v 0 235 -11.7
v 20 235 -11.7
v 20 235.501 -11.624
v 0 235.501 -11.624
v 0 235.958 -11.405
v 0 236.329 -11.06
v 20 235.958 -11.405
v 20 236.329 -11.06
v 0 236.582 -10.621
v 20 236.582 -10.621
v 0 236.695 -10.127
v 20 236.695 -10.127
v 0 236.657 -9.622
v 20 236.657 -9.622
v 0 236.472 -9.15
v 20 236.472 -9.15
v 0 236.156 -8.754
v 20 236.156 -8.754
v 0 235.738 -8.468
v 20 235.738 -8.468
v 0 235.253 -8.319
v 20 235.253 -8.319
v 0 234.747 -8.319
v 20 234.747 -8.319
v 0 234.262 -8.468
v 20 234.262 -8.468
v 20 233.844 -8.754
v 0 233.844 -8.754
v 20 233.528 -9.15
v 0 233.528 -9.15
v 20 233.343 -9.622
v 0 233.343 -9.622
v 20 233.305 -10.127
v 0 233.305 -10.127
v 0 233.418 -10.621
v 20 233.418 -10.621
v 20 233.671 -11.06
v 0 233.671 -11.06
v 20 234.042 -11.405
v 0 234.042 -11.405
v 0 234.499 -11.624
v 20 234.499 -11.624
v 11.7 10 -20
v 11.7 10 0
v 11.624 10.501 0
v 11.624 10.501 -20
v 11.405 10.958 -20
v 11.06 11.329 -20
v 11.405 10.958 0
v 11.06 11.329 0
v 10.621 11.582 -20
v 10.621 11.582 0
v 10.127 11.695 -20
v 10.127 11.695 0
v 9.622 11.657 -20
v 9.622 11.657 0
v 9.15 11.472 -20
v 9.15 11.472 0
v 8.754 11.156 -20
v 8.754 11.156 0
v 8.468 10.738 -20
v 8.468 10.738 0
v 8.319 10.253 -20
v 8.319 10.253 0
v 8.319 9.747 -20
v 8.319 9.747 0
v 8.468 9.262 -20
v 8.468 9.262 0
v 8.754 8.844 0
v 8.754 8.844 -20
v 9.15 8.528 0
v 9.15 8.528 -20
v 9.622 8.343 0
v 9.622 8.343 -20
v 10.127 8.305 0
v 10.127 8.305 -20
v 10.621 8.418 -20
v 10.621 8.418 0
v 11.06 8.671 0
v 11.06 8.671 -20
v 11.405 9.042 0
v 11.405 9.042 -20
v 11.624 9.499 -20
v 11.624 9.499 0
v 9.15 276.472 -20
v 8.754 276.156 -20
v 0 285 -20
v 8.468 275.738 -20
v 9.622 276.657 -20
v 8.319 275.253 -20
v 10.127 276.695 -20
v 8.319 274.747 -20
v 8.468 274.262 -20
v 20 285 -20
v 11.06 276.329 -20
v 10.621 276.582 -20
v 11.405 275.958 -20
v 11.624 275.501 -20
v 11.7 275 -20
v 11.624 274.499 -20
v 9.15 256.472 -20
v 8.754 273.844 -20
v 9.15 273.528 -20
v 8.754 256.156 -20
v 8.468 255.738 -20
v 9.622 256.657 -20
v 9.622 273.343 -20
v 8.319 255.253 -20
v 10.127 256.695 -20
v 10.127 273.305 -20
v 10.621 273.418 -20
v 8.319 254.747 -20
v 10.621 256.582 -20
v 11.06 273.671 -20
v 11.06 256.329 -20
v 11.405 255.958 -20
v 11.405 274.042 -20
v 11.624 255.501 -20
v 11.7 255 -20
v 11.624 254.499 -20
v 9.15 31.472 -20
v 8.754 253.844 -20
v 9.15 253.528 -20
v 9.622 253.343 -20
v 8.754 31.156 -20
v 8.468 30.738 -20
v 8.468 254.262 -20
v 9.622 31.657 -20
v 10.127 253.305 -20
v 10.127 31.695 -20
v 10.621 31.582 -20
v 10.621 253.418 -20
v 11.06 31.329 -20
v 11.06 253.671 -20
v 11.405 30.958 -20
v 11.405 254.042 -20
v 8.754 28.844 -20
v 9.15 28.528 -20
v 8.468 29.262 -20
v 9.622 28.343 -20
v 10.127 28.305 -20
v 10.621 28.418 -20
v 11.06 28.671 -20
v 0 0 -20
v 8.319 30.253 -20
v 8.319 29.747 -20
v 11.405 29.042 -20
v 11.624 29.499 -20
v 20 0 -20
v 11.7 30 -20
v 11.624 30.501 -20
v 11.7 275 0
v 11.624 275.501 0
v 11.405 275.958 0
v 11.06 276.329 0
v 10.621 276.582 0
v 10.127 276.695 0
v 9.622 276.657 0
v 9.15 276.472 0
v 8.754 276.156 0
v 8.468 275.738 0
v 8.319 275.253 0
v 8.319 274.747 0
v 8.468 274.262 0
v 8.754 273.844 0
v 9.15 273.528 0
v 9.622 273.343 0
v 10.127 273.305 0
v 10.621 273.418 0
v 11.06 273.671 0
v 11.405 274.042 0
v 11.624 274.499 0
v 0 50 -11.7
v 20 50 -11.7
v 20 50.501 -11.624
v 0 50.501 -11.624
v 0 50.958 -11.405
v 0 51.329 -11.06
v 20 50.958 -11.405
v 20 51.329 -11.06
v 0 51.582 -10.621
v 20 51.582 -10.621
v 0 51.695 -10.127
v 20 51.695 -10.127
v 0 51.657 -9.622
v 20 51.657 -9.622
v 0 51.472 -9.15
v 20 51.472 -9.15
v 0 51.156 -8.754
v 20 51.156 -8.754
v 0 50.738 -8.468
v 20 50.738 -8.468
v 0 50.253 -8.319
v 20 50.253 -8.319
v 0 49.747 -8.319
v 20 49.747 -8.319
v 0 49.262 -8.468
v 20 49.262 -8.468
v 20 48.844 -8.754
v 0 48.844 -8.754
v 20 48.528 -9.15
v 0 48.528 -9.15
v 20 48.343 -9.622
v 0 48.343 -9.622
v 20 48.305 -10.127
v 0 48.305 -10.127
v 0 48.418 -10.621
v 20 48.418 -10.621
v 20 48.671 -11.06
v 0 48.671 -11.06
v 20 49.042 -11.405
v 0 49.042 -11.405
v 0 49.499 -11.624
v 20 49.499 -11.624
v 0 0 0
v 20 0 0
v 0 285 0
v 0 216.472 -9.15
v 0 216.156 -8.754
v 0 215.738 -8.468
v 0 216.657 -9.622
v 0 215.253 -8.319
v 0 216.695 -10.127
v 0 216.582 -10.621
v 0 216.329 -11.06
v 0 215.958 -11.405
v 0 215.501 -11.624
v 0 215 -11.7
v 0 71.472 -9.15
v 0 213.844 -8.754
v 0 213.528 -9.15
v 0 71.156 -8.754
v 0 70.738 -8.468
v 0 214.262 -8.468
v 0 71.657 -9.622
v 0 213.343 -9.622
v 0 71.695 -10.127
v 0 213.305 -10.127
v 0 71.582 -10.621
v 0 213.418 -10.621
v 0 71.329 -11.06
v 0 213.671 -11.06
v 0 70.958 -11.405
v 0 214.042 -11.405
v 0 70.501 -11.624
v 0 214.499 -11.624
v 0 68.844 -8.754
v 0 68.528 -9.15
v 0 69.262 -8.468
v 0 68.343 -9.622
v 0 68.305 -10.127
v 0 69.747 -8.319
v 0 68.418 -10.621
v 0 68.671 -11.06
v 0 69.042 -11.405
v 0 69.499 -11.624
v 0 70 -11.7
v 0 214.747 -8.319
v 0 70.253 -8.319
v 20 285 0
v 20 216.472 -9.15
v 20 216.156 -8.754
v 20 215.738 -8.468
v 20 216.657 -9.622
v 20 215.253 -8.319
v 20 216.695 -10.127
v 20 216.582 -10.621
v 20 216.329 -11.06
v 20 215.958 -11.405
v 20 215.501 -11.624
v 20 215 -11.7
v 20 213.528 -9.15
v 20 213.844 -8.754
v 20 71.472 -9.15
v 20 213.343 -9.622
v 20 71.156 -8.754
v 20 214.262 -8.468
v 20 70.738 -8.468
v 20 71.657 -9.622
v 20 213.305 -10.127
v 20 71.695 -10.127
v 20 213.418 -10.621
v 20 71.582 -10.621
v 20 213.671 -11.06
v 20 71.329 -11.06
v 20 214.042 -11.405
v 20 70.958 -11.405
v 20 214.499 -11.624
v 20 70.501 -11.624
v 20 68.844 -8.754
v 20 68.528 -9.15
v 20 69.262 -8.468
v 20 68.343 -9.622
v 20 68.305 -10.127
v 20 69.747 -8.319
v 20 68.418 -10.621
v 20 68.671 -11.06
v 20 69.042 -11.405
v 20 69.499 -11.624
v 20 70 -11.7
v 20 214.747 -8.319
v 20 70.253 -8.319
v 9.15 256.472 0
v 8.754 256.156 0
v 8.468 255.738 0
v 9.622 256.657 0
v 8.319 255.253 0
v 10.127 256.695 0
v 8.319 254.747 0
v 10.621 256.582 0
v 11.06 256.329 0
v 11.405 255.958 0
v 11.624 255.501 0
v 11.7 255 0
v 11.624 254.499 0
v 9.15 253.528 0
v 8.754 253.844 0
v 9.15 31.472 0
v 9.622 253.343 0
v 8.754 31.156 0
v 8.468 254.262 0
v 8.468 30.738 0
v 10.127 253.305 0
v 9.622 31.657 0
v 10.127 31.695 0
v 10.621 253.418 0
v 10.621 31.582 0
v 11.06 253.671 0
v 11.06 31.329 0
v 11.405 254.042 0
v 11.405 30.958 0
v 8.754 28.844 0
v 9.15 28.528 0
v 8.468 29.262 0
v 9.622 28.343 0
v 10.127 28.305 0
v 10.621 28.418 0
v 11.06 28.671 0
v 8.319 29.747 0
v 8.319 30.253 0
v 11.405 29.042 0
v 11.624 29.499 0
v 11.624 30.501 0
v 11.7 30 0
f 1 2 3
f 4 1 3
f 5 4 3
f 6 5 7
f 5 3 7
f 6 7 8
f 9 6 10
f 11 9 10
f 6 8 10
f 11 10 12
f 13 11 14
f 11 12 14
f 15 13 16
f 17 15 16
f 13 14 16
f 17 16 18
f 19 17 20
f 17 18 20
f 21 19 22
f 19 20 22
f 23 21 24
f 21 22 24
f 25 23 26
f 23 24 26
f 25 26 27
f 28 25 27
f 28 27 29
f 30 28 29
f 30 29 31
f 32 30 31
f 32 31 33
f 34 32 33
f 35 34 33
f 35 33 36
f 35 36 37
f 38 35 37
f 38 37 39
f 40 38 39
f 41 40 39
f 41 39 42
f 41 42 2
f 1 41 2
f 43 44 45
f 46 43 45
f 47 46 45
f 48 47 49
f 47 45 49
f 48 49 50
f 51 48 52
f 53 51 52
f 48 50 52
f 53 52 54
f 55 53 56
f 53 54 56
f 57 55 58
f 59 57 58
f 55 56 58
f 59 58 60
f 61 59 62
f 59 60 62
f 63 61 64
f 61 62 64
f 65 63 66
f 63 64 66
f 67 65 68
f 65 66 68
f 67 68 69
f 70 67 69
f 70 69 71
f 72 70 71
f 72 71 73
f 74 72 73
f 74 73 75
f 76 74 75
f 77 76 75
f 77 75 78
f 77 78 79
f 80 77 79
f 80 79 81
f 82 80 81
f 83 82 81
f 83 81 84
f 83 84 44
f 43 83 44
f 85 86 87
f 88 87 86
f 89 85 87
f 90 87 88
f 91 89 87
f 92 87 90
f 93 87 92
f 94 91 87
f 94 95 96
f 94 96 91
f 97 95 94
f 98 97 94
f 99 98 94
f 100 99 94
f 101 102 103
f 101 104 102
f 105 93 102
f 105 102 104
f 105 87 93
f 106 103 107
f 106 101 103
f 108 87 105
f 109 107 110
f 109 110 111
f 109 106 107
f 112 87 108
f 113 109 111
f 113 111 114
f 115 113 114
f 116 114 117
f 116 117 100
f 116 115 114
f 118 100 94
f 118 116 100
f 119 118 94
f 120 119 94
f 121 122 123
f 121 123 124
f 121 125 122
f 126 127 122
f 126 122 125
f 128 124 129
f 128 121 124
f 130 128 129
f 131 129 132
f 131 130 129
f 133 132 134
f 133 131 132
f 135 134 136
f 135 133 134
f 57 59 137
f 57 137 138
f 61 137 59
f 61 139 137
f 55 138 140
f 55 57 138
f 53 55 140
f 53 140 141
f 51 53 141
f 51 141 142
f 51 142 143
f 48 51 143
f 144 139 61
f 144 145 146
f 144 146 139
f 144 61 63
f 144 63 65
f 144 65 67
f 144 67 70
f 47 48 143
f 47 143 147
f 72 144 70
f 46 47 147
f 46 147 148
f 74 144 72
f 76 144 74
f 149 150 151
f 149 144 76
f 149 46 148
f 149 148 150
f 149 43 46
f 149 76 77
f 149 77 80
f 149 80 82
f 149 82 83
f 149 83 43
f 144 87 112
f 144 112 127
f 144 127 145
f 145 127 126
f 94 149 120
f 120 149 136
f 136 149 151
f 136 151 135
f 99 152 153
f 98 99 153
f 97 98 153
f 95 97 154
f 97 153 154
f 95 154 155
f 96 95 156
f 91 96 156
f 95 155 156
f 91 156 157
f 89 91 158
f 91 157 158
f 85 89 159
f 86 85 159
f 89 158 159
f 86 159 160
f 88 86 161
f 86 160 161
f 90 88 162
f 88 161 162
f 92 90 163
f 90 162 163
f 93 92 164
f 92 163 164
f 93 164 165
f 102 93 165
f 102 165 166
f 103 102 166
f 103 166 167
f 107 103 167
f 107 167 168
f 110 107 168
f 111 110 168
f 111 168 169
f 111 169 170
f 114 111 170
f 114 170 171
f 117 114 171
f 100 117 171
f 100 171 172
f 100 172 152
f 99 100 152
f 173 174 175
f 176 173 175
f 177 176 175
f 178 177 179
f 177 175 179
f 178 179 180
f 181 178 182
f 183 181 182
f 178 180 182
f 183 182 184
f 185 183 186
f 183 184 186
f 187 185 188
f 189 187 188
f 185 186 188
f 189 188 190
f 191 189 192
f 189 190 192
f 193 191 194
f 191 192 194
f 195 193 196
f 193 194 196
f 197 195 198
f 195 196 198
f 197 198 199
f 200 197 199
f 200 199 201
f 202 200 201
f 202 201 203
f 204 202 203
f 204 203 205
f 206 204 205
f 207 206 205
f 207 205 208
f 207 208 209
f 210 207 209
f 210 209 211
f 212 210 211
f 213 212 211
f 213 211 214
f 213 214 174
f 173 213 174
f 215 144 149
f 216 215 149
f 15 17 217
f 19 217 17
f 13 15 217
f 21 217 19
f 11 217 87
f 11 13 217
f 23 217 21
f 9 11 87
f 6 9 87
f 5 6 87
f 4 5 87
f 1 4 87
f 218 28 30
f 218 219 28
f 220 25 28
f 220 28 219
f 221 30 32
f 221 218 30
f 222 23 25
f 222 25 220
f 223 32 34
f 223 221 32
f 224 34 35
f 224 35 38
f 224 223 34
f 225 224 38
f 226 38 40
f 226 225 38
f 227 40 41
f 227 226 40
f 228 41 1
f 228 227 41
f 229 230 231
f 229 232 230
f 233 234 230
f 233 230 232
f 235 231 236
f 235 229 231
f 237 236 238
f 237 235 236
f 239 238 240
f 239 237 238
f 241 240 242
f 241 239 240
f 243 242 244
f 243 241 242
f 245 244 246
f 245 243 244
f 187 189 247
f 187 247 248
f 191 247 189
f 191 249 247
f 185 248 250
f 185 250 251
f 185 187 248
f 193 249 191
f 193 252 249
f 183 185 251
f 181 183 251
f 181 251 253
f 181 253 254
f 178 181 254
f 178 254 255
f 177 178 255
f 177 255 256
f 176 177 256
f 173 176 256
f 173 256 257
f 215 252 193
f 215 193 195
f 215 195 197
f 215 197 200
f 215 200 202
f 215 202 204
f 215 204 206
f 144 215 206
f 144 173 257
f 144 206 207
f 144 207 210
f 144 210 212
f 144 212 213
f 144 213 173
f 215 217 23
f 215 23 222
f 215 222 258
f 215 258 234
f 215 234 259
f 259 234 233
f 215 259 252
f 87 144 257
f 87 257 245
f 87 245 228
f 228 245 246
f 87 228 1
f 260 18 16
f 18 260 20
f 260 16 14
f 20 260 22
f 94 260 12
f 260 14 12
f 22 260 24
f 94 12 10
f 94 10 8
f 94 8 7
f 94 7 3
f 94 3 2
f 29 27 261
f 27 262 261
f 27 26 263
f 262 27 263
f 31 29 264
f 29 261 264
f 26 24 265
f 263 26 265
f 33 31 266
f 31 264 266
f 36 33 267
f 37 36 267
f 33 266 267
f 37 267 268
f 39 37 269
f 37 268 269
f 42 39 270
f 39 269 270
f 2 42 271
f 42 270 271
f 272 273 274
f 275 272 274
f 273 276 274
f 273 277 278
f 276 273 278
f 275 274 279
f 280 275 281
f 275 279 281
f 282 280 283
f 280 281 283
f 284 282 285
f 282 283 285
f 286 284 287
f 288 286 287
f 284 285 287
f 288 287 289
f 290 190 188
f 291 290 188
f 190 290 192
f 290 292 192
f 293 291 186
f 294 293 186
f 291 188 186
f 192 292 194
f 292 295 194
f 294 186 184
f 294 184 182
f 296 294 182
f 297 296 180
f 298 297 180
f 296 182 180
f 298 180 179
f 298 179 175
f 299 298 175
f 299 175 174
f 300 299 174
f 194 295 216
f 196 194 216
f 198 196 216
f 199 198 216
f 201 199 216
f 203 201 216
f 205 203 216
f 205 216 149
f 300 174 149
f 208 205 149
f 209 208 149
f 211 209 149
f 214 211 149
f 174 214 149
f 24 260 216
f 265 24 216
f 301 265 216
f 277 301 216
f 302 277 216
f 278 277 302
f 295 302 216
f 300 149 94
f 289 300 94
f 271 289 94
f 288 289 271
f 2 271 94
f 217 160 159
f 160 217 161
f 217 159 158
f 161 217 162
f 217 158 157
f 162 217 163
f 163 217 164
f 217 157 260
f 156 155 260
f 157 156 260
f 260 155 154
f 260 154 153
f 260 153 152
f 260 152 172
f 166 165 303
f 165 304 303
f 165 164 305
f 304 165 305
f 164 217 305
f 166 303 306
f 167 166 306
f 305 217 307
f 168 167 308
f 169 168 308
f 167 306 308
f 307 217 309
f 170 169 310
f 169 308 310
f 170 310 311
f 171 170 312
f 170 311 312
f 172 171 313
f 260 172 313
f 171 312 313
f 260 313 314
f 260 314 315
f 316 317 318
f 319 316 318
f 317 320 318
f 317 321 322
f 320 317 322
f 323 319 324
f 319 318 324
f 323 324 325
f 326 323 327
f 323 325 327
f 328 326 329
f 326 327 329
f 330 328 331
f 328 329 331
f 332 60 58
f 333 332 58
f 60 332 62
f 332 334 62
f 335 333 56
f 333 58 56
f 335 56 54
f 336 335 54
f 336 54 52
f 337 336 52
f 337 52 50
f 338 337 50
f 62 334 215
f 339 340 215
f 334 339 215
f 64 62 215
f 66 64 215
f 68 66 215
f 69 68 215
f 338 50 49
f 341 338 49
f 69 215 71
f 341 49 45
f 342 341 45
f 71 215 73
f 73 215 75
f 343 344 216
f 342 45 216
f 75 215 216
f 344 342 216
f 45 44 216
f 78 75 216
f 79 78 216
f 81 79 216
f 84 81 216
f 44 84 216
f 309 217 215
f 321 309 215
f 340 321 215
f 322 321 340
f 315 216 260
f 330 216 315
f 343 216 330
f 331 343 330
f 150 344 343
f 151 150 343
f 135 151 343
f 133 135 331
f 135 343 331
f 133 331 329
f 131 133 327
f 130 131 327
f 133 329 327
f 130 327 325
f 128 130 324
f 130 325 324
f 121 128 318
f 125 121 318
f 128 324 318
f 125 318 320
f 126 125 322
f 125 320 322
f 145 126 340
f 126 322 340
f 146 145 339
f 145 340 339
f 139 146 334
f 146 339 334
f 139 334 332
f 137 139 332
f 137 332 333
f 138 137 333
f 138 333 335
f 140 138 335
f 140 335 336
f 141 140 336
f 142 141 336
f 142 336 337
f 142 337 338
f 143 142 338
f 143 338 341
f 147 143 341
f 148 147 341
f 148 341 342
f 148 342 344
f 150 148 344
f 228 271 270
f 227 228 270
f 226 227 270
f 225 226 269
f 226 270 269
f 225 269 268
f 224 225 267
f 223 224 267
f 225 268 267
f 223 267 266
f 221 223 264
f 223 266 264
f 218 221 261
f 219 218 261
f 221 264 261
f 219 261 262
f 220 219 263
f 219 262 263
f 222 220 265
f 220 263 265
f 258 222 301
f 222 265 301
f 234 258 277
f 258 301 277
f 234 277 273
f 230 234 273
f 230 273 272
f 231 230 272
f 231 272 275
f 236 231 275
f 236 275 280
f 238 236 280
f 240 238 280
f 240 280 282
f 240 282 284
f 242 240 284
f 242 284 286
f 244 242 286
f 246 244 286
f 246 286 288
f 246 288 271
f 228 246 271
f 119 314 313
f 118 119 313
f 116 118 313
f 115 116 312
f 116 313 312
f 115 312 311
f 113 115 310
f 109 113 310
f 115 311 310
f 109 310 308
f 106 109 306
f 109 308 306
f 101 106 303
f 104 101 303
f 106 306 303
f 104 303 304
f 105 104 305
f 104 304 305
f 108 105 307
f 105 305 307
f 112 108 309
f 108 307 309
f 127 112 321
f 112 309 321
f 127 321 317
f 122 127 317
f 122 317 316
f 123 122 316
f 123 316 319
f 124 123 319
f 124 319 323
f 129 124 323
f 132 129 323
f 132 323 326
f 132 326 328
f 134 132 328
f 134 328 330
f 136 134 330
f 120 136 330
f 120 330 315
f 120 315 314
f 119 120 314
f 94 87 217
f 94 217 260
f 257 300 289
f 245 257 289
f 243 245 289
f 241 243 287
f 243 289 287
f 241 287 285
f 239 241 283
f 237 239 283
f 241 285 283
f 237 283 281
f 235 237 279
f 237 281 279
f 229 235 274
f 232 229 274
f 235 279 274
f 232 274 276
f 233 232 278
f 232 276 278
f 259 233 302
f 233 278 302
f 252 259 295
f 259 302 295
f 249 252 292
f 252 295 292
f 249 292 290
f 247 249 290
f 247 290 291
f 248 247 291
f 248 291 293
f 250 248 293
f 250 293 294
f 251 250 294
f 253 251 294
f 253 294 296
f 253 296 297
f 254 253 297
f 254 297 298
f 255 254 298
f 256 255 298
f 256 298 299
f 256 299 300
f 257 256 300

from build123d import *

# Parameters (mm, degrees)
SKETCH_1_W          = 20
SKETCH_1_H          = 20
EXTRUDE_1_DEPTH     = 285
SKETCH_2_R          = 1.7
CUT_EXTRUDE_1_DEPTH = 287.400069832
SKETCH_3_R          = 1.7
CUT_EXTRUDE_2_DEPTH = 287.400069832


with BuildPart() as part:
    # 草图1 → 凸台-拉伸1 (new body)
    with BuildSketch(Plane(origin=(0, 0, 0), x_dir=(1, 0, 0), z_dir=(0, 1, 0))):
        with Locations((10, 10)):
            Rectangle(SKETCH_1_W, SKETCH_1_H)
    extrude(amount=EXTRUDE_1_DEPTH)

    # 草图2 → 切除-拉伸1 (cut, through all)
    with BuildSketch(Plane.XY):
        with Locations((10, 275)):
            Circle(SKETCH_2_R)
        with Locations((10, 255)):
            Circle(SKETCH_2_R)
        with Locations((10, 30)):
            Circle(SKETCH_2_R)
        with Locations((10, 10)):
            Circle(SKETCH_2_R)
    extrude(amount=-CUT_EXTRUDE_1_DEPTH, mode=Mode.SUBTRACT)

    # 草图3 → 切除-拉伸2 (cut, through all)
    with BuildSketch(Plane(origin=(20, 0, 0), x_dir=(0, 0, -1), z_dir=(1, 0, 0))):
        with Locations((10, 235)):
            Circle(SKETCH_3_R)
        with Locations((10, 215)):
            Circle(SKETCH_3_R)
        with Locations((10, 50)):
            Circle(SKETCH_3_R)
        with Locations((10, 70)):
            Circle(SKETCH_3_R)
    extrude(amount=-CUT_EXTRUDE_2_DEPTH, mode=Mode.SUBTRACT)


solid = part.part
